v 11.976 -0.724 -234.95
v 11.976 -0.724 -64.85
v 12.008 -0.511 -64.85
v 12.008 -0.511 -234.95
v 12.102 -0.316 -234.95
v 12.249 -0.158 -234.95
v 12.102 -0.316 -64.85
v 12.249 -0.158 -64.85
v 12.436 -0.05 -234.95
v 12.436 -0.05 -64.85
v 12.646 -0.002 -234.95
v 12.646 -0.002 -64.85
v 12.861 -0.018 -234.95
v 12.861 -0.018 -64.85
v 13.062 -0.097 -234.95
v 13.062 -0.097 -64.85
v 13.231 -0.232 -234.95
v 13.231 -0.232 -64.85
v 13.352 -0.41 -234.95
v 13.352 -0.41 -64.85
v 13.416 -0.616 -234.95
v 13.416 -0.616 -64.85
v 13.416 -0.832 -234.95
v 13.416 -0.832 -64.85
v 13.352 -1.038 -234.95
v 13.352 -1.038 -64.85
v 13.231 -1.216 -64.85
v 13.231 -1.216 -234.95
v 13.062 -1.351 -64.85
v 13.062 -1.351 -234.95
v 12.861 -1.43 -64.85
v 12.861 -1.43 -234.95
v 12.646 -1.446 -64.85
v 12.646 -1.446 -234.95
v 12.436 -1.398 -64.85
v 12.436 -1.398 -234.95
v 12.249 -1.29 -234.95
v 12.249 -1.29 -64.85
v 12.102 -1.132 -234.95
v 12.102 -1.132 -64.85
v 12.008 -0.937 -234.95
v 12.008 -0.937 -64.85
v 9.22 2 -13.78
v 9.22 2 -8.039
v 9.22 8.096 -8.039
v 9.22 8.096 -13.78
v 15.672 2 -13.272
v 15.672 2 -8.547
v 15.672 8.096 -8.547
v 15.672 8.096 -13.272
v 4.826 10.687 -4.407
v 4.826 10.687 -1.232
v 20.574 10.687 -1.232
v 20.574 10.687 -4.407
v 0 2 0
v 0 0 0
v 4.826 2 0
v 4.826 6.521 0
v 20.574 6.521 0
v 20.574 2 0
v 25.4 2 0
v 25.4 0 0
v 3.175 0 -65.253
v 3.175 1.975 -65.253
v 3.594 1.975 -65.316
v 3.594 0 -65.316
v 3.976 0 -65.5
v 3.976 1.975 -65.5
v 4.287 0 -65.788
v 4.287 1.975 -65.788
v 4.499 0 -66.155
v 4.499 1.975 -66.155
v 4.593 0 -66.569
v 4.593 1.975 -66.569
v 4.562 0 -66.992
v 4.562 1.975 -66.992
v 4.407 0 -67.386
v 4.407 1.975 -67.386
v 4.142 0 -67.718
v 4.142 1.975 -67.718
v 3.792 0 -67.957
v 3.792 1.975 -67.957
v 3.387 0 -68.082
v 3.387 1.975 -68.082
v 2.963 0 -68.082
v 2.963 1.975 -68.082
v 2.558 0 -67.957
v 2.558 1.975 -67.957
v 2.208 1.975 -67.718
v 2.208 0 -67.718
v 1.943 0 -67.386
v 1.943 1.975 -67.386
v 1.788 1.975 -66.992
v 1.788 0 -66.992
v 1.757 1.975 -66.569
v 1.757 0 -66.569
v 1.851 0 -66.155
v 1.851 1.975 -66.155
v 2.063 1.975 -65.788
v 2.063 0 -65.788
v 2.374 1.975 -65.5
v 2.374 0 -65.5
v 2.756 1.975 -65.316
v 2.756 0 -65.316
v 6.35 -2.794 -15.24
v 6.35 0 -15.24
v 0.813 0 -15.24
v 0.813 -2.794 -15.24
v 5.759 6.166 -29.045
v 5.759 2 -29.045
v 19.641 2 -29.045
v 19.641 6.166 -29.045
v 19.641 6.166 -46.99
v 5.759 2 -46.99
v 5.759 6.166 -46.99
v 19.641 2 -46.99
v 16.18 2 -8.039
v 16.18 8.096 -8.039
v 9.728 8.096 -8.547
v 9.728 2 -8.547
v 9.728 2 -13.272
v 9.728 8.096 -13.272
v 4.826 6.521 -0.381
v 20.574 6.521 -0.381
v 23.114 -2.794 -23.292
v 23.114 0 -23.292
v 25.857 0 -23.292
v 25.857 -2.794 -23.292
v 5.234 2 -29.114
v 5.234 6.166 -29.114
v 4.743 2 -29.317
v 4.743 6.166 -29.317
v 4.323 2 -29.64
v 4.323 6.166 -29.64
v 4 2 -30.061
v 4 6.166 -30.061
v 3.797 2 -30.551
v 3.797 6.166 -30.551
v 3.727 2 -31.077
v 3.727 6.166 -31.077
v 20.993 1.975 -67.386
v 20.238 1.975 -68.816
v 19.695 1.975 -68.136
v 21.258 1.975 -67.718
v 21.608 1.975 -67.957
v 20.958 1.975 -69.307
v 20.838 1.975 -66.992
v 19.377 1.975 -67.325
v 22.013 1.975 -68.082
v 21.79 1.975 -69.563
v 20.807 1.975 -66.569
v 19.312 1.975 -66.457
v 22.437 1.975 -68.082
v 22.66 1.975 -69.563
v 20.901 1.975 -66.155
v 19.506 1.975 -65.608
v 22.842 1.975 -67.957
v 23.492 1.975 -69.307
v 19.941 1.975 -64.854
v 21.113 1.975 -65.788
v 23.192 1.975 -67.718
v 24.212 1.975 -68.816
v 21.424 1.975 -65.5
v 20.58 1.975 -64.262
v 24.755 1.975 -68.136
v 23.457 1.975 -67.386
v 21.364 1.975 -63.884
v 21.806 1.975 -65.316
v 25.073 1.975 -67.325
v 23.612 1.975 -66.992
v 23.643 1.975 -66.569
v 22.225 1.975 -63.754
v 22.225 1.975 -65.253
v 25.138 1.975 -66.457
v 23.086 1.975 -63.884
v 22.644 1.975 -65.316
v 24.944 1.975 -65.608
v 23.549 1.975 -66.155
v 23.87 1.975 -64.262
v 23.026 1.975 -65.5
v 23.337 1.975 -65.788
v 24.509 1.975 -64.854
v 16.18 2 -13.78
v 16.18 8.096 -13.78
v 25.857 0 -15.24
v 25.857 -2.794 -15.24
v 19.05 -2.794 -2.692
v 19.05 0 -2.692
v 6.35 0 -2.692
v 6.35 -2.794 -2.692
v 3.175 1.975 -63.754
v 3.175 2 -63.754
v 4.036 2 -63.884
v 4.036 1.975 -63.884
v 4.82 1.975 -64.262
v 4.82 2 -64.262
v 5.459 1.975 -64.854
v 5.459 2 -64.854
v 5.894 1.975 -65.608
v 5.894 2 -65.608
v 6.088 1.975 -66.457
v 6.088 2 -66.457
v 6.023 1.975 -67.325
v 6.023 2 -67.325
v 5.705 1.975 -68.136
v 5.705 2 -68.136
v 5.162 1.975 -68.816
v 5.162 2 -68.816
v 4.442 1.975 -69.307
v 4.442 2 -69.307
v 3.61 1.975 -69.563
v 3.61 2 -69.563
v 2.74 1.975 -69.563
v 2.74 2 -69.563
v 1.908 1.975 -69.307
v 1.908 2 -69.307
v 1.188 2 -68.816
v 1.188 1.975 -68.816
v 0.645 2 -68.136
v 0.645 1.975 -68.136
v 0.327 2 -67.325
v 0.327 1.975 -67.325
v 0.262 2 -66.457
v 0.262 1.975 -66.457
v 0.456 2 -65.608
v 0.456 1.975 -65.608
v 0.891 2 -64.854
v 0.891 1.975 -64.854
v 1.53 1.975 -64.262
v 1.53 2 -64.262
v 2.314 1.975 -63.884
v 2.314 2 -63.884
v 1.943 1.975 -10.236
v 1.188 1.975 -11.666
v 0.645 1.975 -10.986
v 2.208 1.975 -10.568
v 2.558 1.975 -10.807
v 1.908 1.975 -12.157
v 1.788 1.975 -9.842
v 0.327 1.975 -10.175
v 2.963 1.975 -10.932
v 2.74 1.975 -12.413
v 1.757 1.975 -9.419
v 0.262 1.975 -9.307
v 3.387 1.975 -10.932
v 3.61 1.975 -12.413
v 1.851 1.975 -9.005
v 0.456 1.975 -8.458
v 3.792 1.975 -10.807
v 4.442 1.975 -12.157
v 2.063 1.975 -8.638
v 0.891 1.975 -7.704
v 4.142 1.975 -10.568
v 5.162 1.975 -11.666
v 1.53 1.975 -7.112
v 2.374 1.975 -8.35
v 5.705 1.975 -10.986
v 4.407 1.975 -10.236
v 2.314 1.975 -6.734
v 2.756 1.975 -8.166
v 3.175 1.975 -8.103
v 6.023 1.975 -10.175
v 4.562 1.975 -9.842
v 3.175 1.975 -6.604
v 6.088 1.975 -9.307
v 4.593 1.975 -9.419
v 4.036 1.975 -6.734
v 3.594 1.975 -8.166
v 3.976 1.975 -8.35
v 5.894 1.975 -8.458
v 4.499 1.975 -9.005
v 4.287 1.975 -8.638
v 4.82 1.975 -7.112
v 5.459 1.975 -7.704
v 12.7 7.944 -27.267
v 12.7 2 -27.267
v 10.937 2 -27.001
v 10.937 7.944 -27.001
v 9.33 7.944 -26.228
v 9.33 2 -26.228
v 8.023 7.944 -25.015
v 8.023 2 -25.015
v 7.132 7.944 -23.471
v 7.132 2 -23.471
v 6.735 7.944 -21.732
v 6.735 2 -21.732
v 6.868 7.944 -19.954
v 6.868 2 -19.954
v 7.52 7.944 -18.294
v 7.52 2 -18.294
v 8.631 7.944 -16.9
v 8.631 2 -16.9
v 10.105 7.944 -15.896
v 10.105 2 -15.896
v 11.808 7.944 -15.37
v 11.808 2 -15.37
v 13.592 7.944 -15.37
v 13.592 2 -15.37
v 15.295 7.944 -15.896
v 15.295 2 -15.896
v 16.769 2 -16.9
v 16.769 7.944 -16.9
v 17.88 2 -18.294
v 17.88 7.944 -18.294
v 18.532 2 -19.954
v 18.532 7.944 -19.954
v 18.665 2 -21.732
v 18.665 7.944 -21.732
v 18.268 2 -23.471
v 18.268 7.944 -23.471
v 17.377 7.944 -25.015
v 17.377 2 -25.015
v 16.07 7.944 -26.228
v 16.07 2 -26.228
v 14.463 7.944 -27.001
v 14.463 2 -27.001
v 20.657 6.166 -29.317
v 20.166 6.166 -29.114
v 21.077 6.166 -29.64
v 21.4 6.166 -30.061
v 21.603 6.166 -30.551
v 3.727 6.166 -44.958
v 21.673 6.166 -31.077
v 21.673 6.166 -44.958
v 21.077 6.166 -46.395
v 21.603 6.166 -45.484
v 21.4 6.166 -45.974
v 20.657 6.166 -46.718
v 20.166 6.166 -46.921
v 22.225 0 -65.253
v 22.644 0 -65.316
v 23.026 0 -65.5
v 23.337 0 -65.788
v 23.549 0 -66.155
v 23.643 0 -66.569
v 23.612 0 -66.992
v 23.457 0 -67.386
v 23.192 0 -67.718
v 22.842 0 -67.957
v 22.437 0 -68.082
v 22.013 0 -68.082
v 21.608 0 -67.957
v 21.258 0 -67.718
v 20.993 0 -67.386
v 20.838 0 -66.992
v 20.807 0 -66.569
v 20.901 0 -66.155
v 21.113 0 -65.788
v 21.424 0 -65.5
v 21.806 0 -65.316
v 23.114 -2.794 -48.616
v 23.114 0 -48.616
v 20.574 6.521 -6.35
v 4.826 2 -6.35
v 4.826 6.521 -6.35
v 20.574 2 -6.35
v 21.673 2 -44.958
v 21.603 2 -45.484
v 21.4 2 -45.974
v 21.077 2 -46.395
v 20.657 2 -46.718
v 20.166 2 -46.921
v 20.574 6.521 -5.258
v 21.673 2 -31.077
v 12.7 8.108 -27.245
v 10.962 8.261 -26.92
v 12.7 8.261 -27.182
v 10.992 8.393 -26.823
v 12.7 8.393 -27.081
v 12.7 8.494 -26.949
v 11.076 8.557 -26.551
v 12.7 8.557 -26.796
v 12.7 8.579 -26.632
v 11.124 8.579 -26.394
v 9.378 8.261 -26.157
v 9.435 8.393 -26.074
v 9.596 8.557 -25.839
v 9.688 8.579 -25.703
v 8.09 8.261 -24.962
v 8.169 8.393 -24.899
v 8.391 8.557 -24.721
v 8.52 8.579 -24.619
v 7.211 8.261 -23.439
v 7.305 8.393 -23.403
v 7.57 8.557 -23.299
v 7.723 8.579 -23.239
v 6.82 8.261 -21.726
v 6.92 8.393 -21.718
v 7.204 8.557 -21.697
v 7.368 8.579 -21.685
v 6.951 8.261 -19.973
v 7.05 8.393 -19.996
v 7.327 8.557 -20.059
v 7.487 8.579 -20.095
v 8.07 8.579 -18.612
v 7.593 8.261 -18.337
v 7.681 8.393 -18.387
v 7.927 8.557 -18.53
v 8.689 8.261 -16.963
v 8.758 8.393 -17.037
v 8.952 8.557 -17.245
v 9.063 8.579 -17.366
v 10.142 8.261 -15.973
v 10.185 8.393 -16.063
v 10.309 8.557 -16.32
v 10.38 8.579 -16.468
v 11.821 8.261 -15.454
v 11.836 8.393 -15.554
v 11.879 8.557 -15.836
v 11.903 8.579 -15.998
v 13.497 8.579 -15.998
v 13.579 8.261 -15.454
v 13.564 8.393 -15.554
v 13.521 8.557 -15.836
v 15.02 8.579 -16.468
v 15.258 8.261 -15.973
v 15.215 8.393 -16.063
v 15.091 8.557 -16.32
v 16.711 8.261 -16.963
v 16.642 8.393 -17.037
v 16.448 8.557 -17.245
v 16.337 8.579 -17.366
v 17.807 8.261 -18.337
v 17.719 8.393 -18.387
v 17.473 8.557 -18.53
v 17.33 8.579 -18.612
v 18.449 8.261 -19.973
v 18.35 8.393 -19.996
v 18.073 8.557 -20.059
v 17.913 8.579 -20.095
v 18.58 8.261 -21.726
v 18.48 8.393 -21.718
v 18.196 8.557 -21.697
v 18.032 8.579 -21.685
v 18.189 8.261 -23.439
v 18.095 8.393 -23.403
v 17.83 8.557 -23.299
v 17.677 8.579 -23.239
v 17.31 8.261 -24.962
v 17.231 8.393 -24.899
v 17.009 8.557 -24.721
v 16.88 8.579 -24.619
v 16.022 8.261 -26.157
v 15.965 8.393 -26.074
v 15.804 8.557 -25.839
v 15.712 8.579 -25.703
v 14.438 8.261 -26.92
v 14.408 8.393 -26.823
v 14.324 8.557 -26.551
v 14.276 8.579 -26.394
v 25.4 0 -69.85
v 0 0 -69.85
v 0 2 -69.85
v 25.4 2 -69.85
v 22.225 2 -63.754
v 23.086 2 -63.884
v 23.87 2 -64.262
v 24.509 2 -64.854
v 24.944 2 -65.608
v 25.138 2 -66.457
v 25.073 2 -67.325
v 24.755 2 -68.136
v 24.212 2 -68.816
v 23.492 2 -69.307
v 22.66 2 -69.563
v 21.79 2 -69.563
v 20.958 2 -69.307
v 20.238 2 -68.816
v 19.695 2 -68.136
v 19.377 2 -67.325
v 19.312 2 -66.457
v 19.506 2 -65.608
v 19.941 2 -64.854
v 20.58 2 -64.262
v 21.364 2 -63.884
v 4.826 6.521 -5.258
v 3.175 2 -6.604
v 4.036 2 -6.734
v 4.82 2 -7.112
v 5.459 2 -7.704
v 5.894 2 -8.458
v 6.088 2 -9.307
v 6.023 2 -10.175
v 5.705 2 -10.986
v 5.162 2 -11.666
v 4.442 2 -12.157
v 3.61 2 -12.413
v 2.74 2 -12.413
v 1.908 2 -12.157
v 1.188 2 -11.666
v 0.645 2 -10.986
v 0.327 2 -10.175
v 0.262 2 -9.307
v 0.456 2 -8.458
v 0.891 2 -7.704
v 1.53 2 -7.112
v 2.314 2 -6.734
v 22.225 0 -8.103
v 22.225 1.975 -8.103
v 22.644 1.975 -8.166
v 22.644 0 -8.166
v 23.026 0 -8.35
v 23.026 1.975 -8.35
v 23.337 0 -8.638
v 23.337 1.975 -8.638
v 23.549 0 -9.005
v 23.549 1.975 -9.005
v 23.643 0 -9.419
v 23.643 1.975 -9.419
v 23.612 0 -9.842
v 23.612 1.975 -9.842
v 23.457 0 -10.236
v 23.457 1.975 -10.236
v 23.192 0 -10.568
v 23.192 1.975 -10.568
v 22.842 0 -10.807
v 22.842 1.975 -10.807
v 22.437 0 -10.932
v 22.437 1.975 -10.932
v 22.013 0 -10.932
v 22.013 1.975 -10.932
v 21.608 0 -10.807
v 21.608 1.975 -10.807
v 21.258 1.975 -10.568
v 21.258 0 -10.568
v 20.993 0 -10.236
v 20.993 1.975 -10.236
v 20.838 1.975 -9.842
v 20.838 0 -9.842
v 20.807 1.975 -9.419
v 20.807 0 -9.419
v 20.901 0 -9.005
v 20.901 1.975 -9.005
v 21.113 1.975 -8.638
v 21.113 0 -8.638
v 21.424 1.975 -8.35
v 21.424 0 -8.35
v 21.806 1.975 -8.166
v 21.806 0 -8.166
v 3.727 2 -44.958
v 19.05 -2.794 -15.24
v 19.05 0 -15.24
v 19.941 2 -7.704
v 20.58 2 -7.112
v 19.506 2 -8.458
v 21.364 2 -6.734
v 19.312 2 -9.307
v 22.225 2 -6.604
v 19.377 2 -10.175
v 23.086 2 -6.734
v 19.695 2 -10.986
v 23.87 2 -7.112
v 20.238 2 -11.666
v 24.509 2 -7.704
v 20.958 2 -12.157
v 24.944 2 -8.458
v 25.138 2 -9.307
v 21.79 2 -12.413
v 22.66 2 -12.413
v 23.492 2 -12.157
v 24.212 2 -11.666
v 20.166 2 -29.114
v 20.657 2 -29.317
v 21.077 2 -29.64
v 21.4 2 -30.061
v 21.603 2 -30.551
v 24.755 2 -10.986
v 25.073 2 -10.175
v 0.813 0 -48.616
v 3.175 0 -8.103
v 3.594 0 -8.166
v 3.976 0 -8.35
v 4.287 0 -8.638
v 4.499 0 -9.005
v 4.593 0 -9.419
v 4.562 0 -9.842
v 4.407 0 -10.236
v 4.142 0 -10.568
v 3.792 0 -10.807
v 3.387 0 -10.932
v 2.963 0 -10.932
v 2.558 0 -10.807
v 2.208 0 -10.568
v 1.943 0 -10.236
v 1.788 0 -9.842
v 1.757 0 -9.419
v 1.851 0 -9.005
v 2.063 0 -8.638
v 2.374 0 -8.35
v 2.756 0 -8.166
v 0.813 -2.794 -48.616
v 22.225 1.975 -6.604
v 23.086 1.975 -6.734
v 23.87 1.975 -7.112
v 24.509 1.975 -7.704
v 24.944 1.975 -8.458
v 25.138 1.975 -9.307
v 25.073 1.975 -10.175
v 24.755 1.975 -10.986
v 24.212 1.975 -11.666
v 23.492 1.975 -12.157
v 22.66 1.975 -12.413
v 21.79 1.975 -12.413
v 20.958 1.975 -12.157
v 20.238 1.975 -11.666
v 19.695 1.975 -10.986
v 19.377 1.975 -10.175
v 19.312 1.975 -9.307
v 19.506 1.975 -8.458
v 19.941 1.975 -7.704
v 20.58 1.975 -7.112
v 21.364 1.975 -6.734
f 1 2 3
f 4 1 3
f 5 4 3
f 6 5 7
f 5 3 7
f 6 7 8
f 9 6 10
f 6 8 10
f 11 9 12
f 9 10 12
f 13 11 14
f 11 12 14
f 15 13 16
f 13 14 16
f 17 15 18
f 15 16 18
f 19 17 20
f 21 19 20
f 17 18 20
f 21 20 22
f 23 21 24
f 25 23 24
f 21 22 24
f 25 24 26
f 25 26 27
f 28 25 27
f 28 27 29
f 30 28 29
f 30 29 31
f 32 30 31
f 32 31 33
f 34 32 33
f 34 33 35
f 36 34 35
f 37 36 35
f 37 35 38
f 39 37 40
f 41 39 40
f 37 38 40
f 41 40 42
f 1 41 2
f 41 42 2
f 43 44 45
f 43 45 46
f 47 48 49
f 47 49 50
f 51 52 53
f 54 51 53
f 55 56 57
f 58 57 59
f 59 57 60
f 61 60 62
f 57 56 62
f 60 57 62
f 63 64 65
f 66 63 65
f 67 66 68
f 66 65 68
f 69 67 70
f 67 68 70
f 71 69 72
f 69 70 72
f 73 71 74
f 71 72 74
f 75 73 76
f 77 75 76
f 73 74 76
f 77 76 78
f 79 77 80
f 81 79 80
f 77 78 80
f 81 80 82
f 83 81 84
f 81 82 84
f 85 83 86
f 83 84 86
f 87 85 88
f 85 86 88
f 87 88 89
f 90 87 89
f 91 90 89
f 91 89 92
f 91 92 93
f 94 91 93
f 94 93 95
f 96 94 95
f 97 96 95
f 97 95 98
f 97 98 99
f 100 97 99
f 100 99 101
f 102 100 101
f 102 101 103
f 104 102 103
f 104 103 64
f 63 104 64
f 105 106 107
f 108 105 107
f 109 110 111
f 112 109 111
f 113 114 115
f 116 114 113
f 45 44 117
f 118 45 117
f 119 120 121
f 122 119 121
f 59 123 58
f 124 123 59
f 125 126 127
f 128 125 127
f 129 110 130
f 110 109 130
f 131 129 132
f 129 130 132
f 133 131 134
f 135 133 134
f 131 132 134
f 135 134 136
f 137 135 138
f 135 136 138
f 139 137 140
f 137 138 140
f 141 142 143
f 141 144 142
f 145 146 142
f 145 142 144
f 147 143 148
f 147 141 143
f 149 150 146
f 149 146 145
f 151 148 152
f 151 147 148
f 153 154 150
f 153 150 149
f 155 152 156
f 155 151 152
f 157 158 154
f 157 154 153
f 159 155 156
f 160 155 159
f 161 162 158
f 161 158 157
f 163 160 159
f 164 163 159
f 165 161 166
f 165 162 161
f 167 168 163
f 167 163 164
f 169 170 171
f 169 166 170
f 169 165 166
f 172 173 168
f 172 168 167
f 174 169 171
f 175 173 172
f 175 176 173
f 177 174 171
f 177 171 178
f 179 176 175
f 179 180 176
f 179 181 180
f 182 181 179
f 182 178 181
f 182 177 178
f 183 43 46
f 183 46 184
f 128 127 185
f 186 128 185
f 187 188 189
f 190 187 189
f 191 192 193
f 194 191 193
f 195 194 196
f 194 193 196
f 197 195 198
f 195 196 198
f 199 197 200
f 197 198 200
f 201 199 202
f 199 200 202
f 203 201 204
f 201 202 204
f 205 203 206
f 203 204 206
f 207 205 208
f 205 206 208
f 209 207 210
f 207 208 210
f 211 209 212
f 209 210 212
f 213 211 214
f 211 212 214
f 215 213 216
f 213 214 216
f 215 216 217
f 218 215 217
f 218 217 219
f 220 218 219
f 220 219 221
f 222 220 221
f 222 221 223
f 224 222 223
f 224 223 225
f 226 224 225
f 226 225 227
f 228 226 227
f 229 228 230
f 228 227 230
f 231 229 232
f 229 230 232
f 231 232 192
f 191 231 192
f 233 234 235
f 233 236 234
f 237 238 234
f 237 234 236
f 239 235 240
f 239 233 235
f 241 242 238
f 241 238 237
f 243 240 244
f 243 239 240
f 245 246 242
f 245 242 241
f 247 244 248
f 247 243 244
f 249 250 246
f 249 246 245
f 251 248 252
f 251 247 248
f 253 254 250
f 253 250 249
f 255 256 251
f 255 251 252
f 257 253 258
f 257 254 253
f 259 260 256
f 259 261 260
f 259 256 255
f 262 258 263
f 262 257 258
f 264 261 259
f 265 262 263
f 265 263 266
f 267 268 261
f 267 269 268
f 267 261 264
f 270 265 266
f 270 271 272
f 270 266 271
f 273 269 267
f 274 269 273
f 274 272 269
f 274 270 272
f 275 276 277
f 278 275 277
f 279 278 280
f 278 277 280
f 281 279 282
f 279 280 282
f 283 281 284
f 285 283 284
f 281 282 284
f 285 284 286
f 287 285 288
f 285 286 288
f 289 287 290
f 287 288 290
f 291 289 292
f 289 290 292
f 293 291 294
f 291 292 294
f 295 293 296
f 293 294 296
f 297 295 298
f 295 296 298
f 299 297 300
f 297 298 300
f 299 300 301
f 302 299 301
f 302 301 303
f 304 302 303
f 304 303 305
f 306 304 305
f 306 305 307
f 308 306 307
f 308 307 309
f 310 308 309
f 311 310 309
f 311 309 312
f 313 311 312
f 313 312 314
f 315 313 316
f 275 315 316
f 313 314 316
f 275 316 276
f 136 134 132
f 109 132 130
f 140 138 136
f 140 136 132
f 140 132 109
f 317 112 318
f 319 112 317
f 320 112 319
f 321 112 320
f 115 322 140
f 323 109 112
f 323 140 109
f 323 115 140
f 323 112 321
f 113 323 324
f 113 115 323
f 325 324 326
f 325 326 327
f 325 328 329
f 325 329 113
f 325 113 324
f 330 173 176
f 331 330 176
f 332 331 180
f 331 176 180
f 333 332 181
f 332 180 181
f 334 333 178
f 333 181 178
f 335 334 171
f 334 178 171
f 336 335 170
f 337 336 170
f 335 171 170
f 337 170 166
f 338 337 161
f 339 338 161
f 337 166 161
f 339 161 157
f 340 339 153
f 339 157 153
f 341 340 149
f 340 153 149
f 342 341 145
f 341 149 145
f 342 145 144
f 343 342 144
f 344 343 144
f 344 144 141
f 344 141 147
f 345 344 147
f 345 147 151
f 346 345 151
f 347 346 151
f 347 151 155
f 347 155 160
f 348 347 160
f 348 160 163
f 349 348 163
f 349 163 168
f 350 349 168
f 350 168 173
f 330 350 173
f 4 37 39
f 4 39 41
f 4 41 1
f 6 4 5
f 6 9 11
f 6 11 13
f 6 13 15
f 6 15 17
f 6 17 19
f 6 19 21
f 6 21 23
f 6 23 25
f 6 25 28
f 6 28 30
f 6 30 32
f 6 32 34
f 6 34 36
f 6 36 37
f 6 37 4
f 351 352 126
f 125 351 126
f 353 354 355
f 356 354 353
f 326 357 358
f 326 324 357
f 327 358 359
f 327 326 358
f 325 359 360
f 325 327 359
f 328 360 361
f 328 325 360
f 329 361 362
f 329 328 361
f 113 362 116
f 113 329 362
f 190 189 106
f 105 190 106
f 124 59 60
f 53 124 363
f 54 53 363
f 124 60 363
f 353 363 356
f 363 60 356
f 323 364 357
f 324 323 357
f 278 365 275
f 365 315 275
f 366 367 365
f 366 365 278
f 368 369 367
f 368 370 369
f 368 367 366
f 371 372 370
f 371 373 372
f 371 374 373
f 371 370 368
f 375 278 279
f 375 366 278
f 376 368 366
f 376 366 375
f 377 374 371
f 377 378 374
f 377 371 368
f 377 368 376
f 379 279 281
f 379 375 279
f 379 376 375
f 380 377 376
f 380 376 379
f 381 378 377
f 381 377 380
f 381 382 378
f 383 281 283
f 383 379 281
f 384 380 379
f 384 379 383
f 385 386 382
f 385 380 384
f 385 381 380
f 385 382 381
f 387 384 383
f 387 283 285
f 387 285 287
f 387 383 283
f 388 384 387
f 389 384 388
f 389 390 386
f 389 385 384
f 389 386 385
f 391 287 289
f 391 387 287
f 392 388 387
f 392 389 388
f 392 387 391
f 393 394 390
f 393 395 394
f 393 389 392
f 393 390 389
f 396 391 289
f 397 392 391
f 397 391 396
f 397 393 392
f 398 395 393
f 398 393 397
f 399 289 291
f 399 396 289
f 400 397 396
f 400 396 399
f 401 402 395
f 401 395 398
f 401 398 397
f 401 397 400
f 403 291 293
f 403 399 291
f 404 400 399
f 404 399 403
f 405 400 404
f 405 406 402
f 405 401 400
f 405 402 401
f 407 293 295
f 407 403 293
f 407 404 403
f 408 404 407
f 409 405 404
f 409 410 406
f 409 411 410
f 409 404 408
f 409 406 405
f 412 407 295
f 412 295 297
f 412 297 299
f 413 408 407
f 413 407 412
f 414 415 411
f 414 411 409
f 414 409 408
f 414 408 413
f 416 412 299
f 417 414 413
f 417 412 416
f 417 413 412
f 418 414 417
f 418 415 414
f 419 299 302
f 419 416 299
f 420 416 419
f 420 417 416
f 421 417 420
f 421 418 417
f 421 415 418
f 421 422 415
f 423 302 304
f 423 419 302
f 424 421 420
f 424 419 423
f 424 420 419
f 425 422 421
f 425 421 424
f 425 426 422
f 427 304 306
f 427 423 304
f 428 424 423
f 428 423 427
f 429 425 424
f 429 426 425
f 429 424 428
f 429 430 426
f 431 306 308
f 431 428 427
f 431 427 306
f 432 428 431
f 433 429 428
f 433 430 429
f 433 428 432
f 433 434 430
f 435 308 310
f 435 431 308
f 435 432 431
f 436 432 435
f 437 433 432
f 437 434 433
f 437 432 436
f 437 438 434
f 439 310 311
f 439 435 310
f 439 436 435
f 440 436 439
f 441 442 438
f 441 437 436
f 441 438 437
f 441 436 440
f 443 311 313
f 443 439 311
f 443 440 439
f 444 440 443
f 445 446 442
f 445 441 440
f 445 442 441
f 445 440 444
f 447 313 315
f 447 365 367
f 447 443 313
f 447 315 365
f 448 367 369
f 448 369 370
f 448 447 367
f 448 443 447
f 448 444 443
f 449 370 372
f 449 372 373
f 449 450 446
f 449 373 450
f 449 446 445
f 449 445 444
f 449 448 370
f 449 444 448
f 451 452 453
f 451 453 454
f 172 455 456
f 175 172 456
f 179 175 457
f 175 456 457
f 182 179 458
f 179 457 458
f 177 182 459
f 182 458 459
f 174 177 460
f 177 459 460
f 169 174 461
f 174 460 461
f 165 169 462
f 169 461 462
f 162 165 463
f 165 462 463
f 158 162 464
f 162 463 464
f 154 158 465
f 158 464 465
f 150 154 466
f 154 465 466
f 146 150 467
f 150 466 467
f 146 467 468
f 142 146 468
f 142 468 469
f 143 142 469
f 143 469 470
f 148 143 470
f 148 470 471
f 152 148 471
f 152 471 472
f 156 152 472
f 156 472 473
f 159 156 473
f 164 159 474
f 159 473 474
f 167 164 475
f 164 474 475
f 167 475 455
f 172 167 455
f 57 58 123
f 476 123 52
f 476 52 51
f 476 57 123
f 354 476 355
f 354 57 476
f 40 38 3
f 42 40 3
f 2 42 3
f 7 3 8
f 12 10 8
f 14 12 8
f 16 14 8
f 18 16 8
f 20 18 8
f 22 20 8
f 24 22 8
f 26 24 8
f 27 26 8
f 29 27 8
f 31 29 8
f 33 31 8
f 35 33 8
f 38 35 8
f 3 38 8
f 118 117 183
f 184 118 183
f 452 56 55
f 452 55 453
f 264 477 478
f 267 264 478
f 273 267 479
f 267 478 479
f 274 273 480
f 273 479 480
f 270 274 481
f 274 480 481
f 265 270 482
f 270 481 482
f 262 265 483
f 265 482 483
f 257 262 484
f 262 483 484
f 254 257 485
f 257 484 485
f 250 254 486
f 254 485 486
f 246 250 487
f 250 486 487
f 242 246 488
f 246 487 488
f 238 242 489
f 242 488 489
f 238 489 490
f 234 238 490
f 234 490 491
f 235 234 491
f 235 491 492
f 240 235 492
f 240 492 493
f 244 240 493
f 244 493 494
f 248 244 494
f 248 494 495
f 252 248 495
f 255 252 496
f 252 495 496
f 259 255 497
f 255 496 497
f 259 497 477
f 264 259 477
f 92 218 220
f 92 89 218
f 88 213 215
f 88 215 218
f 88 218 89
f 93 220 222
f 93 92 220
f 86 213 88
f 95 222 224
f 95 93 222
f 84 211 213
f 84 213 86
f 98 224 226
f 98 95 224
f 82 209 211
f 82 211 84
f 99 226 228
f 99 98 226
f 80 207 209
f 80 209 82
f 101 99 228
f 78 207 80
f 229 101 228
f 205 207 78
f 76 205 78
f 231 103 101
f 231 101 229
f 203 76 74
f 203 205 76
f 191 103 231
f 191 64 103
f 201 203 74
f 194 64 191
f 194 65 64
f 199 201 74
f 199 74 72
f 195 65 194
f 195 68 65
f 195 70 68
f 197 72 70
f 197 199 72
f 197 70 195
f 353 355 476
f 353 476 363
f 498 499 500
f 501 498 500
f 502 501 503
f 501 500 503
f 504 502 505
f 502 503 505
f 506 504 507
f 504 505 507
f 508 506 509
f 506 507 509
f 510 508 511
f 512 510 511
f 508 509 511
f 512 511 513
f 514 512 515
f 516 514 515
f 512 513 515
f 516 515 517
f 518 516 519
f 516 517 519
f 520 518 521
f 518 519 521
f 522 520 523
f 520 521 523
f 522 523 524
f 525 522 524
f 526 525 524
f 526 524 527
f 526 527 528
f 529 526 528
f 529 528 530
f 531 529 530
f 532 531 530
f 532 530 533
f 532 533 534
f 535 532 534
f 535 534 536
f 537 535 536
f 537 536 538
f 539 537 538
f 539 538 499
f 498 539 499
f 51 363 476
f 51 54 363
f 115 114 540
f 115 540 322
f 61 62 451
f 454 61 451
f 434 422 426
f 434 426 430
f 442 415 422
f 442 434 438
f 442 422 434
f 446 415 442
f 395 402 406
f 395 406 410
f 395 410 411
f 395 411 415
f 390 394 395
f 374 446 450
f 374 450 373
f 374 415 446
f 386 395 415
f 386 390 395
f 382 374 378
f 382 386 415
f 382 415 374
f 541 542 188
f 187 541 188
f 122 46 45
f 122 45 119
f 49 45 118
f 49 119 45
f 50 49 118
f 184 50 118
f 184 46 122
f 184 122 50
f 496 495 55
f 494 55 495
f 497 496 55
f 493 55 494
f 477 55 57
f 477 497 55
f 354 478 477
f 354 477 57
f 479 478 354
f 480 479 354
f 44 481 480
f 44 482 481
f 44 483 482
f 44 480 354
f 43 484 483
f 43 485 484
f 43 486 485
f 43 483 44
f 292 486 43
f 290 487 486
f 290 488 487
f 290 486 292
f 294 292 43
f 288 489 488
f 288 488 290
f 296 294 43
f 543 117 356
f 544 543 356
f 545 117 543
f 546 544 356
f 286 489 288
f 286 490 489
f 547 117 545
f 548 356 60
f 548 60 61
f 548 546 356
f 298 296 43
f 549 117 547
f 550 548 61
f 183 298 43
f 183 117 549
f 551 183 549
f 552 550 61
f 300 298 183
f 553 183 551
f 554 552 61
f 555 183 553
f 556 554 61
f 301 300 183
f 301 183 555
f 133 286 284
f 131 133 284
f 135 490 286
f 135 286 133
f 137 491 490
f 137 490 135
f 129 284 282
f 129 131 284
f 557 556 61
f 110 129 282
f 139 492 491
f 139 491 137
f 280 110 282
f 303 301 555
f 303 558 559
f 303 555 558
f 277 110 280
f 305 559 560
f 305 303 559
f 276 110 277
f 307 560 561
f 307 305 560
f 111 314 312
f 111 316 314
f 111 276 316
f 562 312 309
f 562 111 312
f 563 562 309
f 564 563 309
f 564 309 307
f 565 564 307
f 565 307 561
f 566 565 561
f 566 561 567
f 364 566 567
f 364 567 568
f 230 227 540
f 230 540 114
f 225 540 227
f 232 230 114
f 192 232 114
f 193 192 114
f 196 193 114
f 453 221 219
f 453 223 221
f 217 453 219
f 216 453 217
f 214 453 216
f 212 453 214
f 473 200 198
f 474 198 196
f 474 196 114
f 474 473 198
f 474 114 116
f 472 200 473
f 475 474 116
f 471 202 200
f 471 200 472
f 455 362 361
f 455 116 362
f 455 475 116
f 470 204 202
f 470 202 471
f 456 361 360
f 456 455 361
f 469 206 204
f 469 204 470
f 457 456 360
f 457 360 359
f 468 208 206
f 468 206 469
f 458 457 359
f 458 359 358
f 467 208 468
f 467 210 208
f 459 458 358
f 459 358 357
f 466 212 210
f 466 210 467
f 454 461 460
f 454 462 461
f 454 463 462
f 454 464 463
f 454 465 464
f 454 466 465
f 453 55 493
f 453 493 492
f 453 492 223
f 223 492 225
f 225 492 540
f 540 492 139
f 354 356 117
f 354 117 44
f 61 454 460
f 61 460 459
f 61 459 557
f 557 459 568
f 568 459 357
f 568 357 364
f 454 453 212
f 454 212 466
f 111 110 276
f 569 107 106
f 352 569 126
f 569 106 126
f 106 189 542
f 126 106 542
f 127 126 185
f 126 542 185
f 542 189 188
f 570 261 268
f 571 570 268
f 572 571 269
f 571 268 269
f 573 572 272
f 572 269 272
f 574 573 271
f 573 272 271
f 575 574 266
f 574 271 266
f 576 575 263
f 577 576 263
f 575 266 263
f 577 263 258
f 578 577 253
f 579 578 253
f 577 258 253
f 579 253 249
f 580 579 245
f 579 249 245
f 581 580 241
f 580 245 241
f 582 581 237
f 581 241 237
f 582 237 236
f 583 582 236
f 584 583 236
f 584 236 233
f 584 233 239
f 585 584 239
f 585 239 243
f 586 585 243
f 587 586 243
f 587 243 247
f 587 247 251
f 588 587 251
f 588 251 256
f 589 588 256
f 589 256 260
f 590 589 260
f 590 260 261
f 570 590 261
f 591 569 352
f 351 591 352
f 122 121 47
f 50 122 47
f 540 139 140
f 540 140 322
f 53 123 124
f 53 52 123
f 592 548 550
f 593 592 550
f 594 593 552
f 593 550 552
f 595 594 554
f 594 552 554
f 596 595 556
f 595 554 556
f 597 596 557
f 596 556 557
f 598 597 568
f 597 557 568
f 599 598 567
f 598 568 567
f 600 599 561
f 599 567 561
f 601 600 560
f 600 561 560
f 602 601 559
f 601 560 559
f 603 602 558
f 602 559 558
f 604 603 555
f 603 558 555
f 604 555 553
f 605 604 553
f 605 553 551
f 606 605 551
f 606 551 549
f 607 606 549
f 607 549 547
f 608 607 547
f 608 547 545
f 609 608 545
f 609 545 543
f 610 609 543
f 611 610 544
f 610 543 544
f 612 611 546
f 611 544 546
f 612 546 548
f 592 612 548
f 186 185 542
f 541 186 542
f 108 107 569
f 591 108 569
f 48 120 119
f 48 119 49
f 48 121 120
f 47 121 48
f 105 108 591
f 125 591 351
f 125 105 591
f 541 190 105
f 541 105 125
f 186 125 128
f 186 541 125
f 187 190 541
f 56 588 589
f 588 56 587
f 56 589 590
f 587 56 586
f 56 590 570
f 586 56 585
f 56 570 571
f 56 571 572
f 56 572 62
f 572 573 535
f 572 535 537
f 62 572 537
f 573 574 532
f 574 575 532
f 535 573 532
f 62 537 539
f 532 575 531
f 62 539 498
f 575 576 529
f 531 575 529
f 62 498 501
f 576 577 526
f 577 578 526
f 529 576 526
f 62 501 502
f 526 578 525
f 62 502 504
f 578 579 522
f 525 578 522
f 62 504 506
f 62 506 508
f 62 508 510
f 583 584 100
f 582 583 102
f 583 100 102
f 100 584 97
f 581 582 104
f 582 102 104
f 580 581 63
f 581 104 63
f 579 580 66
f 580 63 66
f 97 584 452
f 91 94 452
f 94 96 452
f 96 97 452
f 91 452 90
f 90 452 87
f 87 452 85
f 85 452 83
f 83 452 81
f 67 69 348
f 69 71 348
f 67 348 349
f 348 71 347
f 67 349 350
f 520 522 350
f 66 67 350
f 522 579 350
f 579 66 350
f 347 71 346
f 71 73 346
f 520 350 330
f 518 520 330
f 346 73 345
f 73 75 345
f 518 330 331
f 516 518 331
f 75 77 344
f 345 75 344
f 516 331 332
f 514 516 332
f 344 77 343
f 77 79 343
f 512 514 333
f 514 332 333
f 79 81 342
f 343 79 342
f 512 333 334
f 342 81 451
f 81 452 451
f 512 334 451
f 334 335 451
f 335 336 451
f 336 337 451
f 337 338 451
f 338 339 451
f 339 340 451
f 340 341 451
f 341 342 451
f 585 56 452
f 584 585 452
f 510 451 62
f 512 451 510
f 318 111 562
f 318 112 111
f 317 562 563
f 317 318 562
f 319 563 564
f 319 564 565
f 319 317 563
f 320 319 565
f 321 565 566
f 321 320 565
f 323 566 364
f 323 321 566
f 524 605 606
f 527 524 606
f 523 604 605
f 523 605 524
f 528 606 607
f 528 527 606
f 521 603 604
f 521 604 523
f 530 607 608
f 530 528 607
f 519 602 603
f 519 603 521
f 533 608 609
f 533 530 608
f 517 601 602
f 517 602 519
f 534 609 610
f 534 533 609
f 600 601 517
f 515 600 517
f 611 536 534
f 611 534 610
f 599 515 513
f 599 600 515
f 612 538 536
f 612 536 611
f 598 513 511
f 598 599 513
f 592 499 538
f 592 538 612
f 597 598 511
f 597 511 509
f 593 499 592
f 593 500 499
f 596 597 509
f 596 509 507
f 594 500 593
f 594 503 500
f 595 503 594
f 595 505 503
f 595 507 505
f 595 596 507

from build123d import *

# Parameters (mm, degrees)
SKETCH1_W                = 25.4
SKETCH1_H                = 69.85
BOARDOUTLINE_DEPTH       = 2
SKETCH2_R                = 1.4224
SCREWHOLES_DEPTH         = 2
SKETCH7_R                = 2.921
SCREWPADS_DEPTH          = 0.0254
ANTENNA_DEPTH            = 165.1
ANTENNA_DEPTH_BACK       = 5
SKETCH3_R                = 0.7239
SKETCH4_W                = 15.748
SKETCH4_H                = 6.35
BOSS_EXTRUDE3_DEPTH      = 4.5212
SKETCH5_W                = 17.9451
SKETCH5_H                = 17.9451
GPS_MAINBOX_DEPTH        = 4.1656
FILLET1_R                = 2.032
CHAMFER1_SIZE            = 2.032
SKETCH6_R                = 5.9817
BUZZER_BOX_DEPTH         = 6.5786
FILLET2_R                = 0.635
SKETCH8_W                = 6.9596
SKETCH8_H                = 5.7404
SKETCH8_W_2              = 5.9436
SKETCH8_H_2              = 4.7244
BATTERYTERMINAL_DEPTH    = 6.096
BACKSIDECOMPONENTS_DEPTH = 2.794


with BuildPart() as part:
    # Sketch1 → boardOutline (new body)
    with BuildSketch(Plane(origin=(0, 0, 0), x_dir=(1, 0, 0), z_dir=(0, 1, 0))):
        with Locations((12.7, 34.925)):
            Rectangle(SKETCH1_W, SKETCH1_H)
    extrude(amount=BOARDOUTLINE_DEPTH)

    # Sketch2 → screwHoles (cut)
    with BuildSketch(Plane(origin=(0, 2, 0), x_dir=(1, 0, 0), z_dir=(0, 1, 0))):
        with Locations(Location((3.175, 66.675, 0), (0, 0, 270))):
            Circle(SKETCH2_R)
        with Locations(Location((22.225, 66.675, 0), (0, 0, 270))):
            Circle(SKETCH2_R)
        with Locations(Location((3.175, 9.525, 0), (0, 0, 270))):
            Circle(SKETCH2_R)
        with Locations(Location((22.225, 9.525, 0), (0, 0, 270))):
            Circle(SKETCH2_R)
    extrude(amount=-SCREWHOLES_DEPTH, mode=Mode.SUBTRACT)

    # Sketch7 → screwPads (cut)
    with BuildSketch(Plane(origin=(0, 2, 0), x_dir=(1, 0, 0), z_dir=(0, 1, 0))):
        with Locations(Location((3.175, 9.525, 0), (0, 0, 270))):
            Circle(SKETCH7_R)
        with Locations(Location((22.225, 9.525, 0), (0, 0, 270))):
            Circle(SKETCH7_R)
        with Locations(Location((3.175, 66.675, 0), (0, 0, 270))):
            Circle(SKETCH7_R)
        with Locations(Location((22.225, 66.675, 0), (0, 0, 270))):
            Circle(SKETCH7_R)
    extrude(amount=-SCREWPADS_DEPTH, mode=Mode.SUBTRACT)

    # Sketch4 → Boss-Extrude3 (add)
    with BuildSketch(Plane(origin=(0, 2, 0), x_dir=(1, 0, 0), z_dir=(0, 1, 0))):
        with Locations((12.7, 3.175)):
            Rectangle(SKETCH4_W, SKETCH4_H)
    extrude(amount=BOSS_EXTRUDE3_DEPTH)

    # Sketch10 → Loft1 section 0
    with BuildSketch(Plane(origin=(0, 6.5212, 0), x_dir=(1, 0, 0), z_dir=(0, 1, 0))):
        with BuildLine():
            Line((4.826, 0.381), (20.574, 0.381))
            Line((20.574, 0.381), (20.574, 5.2578))
            Line((20.574, 5.2578), (4.826, 5.2578))
            Line((4.826, 5.2578), (4.826, 0.381))
        make_face()
    # Sketch11 → Loft1 section 1
    with BuildSketch(Plane(origin=(0, 10.6868, 0), x_dir=(1, 0, 0), z_dir=(0, 1, 0))):
        with BuildLine():
            Line((4.826, 1.2319), (20.574, 1.2319))
            Line((20.574, 1.2319), (20.574, 4.4069))
            Line((20.574, 4.4069), (4.826, 4.4069))
            Line((4.826, 4.4069), (4.826, 1.2319))
        make_face()
    loft()

    # Sketch5 → GPS_mainbox (add)
    with BuildSketch(Plane(origin=(0, 2, 0), x_dir=(1, 0, 0), z_dir=(0, 1, 0))):
        with Locations((12.7, 38.01745)):
            Rectangle(SKETCH5_W, SKETCH5_H)
    extrude(amount=GPS_MAINBOX_DEPTH)

    # Fillet1
    fillet1_edges = [part.edges().sort_by_distance(p)[0] for p in [
        (3.72745, 4.0828, -29.0449),
        (21.67255, 4.0828, -29.0449),
        (21.67255, 4.0828, -46.99),
    ]]
    fillet(fillet1_edges, radius=FILLET1_R)

    # Chamfer1
    chamfer1_edges = [part.edges().sort_by_distance(p)[0] for p in [
        (3.72745, 4.0828, -46.99),
    ]]
    chamfer(chamfer1_edges, length=CHAMFER1_SIZE)

    # Sketch6 → buzzer_box (add)
    with BuildSketch(Plane(origin=(0, 2, 0), x_dir=(1, 0, 0), z_dir=(0, 1, 0))):
        with Locations(Location((12.7, 21.2852, 0), (0, 0, 90))):
            Circle(SKETCH6_R)
    extrude(amount=BUZZER_BOX_DEPTH)

    # Fillet2
    fillet2_edges = [part.edges().sort_by_distance(p)[0] for p in [
        (12.7, 8.5786, -15.3035),
    ]]
    fillet(fillet2_edges, radius=FILLET2_R)

    # Sketch8 → batteryTerminal (add)
    with BuildSketch(Plane(origin=(0, 2, 0), x_dir=(1, 0, 0), z_dir=(0, 1, 0))):
        with Locations((12.7, 10.9093)):
            Rectangle(SKETCH8_W, SKETCH8_H)
        with Locations((12.7, 10.9093)):
            Rectangle(SKETCH8_W_2, SKETCH8_H_2, mode=Mode.SUBTRACT)
    extrude(amount=BATTERYTERMINAL_DEPTH)


with BuildPart() as body_2:
    # Sketch3 → antenna (new, two sides: drawn at the far end of the back side and taken through both)
    with BuildSketch(Plane(origin=(0, 0, -69.85), x_dir=(-1, 0, 0), z_dir=(0, 0, -1)).offset(-ANTENNA_DEPTH_BACK)):
        with Locations((-12.7, -0.7239)):
            Circle(SKETCH3_R)
    extrude(amount=ANTENNA_DEPTH + ANTENNA_DEPTH_BACK)


with BuildPart() as body_3:
    # Sketch12 → backsideComponents (new body)
    with BuildSketch(Plane.XZ):
        Polygon((0.8128, -15.24), (0.8128, -48.6156), (23.114, -48.6156), (23.114, -23.2918), (25.8572, -23.2918), (25.8572, -15.24), (19.05, -15.24), (19.05, -2.6924), (6.35, -2.6924), (6.35, -15.24), align=None)
    extrude(amount=BACKSIDECOMPONENTS_DEPTH)


solid = Compound([part.part, body_2.part, body_3.part])
